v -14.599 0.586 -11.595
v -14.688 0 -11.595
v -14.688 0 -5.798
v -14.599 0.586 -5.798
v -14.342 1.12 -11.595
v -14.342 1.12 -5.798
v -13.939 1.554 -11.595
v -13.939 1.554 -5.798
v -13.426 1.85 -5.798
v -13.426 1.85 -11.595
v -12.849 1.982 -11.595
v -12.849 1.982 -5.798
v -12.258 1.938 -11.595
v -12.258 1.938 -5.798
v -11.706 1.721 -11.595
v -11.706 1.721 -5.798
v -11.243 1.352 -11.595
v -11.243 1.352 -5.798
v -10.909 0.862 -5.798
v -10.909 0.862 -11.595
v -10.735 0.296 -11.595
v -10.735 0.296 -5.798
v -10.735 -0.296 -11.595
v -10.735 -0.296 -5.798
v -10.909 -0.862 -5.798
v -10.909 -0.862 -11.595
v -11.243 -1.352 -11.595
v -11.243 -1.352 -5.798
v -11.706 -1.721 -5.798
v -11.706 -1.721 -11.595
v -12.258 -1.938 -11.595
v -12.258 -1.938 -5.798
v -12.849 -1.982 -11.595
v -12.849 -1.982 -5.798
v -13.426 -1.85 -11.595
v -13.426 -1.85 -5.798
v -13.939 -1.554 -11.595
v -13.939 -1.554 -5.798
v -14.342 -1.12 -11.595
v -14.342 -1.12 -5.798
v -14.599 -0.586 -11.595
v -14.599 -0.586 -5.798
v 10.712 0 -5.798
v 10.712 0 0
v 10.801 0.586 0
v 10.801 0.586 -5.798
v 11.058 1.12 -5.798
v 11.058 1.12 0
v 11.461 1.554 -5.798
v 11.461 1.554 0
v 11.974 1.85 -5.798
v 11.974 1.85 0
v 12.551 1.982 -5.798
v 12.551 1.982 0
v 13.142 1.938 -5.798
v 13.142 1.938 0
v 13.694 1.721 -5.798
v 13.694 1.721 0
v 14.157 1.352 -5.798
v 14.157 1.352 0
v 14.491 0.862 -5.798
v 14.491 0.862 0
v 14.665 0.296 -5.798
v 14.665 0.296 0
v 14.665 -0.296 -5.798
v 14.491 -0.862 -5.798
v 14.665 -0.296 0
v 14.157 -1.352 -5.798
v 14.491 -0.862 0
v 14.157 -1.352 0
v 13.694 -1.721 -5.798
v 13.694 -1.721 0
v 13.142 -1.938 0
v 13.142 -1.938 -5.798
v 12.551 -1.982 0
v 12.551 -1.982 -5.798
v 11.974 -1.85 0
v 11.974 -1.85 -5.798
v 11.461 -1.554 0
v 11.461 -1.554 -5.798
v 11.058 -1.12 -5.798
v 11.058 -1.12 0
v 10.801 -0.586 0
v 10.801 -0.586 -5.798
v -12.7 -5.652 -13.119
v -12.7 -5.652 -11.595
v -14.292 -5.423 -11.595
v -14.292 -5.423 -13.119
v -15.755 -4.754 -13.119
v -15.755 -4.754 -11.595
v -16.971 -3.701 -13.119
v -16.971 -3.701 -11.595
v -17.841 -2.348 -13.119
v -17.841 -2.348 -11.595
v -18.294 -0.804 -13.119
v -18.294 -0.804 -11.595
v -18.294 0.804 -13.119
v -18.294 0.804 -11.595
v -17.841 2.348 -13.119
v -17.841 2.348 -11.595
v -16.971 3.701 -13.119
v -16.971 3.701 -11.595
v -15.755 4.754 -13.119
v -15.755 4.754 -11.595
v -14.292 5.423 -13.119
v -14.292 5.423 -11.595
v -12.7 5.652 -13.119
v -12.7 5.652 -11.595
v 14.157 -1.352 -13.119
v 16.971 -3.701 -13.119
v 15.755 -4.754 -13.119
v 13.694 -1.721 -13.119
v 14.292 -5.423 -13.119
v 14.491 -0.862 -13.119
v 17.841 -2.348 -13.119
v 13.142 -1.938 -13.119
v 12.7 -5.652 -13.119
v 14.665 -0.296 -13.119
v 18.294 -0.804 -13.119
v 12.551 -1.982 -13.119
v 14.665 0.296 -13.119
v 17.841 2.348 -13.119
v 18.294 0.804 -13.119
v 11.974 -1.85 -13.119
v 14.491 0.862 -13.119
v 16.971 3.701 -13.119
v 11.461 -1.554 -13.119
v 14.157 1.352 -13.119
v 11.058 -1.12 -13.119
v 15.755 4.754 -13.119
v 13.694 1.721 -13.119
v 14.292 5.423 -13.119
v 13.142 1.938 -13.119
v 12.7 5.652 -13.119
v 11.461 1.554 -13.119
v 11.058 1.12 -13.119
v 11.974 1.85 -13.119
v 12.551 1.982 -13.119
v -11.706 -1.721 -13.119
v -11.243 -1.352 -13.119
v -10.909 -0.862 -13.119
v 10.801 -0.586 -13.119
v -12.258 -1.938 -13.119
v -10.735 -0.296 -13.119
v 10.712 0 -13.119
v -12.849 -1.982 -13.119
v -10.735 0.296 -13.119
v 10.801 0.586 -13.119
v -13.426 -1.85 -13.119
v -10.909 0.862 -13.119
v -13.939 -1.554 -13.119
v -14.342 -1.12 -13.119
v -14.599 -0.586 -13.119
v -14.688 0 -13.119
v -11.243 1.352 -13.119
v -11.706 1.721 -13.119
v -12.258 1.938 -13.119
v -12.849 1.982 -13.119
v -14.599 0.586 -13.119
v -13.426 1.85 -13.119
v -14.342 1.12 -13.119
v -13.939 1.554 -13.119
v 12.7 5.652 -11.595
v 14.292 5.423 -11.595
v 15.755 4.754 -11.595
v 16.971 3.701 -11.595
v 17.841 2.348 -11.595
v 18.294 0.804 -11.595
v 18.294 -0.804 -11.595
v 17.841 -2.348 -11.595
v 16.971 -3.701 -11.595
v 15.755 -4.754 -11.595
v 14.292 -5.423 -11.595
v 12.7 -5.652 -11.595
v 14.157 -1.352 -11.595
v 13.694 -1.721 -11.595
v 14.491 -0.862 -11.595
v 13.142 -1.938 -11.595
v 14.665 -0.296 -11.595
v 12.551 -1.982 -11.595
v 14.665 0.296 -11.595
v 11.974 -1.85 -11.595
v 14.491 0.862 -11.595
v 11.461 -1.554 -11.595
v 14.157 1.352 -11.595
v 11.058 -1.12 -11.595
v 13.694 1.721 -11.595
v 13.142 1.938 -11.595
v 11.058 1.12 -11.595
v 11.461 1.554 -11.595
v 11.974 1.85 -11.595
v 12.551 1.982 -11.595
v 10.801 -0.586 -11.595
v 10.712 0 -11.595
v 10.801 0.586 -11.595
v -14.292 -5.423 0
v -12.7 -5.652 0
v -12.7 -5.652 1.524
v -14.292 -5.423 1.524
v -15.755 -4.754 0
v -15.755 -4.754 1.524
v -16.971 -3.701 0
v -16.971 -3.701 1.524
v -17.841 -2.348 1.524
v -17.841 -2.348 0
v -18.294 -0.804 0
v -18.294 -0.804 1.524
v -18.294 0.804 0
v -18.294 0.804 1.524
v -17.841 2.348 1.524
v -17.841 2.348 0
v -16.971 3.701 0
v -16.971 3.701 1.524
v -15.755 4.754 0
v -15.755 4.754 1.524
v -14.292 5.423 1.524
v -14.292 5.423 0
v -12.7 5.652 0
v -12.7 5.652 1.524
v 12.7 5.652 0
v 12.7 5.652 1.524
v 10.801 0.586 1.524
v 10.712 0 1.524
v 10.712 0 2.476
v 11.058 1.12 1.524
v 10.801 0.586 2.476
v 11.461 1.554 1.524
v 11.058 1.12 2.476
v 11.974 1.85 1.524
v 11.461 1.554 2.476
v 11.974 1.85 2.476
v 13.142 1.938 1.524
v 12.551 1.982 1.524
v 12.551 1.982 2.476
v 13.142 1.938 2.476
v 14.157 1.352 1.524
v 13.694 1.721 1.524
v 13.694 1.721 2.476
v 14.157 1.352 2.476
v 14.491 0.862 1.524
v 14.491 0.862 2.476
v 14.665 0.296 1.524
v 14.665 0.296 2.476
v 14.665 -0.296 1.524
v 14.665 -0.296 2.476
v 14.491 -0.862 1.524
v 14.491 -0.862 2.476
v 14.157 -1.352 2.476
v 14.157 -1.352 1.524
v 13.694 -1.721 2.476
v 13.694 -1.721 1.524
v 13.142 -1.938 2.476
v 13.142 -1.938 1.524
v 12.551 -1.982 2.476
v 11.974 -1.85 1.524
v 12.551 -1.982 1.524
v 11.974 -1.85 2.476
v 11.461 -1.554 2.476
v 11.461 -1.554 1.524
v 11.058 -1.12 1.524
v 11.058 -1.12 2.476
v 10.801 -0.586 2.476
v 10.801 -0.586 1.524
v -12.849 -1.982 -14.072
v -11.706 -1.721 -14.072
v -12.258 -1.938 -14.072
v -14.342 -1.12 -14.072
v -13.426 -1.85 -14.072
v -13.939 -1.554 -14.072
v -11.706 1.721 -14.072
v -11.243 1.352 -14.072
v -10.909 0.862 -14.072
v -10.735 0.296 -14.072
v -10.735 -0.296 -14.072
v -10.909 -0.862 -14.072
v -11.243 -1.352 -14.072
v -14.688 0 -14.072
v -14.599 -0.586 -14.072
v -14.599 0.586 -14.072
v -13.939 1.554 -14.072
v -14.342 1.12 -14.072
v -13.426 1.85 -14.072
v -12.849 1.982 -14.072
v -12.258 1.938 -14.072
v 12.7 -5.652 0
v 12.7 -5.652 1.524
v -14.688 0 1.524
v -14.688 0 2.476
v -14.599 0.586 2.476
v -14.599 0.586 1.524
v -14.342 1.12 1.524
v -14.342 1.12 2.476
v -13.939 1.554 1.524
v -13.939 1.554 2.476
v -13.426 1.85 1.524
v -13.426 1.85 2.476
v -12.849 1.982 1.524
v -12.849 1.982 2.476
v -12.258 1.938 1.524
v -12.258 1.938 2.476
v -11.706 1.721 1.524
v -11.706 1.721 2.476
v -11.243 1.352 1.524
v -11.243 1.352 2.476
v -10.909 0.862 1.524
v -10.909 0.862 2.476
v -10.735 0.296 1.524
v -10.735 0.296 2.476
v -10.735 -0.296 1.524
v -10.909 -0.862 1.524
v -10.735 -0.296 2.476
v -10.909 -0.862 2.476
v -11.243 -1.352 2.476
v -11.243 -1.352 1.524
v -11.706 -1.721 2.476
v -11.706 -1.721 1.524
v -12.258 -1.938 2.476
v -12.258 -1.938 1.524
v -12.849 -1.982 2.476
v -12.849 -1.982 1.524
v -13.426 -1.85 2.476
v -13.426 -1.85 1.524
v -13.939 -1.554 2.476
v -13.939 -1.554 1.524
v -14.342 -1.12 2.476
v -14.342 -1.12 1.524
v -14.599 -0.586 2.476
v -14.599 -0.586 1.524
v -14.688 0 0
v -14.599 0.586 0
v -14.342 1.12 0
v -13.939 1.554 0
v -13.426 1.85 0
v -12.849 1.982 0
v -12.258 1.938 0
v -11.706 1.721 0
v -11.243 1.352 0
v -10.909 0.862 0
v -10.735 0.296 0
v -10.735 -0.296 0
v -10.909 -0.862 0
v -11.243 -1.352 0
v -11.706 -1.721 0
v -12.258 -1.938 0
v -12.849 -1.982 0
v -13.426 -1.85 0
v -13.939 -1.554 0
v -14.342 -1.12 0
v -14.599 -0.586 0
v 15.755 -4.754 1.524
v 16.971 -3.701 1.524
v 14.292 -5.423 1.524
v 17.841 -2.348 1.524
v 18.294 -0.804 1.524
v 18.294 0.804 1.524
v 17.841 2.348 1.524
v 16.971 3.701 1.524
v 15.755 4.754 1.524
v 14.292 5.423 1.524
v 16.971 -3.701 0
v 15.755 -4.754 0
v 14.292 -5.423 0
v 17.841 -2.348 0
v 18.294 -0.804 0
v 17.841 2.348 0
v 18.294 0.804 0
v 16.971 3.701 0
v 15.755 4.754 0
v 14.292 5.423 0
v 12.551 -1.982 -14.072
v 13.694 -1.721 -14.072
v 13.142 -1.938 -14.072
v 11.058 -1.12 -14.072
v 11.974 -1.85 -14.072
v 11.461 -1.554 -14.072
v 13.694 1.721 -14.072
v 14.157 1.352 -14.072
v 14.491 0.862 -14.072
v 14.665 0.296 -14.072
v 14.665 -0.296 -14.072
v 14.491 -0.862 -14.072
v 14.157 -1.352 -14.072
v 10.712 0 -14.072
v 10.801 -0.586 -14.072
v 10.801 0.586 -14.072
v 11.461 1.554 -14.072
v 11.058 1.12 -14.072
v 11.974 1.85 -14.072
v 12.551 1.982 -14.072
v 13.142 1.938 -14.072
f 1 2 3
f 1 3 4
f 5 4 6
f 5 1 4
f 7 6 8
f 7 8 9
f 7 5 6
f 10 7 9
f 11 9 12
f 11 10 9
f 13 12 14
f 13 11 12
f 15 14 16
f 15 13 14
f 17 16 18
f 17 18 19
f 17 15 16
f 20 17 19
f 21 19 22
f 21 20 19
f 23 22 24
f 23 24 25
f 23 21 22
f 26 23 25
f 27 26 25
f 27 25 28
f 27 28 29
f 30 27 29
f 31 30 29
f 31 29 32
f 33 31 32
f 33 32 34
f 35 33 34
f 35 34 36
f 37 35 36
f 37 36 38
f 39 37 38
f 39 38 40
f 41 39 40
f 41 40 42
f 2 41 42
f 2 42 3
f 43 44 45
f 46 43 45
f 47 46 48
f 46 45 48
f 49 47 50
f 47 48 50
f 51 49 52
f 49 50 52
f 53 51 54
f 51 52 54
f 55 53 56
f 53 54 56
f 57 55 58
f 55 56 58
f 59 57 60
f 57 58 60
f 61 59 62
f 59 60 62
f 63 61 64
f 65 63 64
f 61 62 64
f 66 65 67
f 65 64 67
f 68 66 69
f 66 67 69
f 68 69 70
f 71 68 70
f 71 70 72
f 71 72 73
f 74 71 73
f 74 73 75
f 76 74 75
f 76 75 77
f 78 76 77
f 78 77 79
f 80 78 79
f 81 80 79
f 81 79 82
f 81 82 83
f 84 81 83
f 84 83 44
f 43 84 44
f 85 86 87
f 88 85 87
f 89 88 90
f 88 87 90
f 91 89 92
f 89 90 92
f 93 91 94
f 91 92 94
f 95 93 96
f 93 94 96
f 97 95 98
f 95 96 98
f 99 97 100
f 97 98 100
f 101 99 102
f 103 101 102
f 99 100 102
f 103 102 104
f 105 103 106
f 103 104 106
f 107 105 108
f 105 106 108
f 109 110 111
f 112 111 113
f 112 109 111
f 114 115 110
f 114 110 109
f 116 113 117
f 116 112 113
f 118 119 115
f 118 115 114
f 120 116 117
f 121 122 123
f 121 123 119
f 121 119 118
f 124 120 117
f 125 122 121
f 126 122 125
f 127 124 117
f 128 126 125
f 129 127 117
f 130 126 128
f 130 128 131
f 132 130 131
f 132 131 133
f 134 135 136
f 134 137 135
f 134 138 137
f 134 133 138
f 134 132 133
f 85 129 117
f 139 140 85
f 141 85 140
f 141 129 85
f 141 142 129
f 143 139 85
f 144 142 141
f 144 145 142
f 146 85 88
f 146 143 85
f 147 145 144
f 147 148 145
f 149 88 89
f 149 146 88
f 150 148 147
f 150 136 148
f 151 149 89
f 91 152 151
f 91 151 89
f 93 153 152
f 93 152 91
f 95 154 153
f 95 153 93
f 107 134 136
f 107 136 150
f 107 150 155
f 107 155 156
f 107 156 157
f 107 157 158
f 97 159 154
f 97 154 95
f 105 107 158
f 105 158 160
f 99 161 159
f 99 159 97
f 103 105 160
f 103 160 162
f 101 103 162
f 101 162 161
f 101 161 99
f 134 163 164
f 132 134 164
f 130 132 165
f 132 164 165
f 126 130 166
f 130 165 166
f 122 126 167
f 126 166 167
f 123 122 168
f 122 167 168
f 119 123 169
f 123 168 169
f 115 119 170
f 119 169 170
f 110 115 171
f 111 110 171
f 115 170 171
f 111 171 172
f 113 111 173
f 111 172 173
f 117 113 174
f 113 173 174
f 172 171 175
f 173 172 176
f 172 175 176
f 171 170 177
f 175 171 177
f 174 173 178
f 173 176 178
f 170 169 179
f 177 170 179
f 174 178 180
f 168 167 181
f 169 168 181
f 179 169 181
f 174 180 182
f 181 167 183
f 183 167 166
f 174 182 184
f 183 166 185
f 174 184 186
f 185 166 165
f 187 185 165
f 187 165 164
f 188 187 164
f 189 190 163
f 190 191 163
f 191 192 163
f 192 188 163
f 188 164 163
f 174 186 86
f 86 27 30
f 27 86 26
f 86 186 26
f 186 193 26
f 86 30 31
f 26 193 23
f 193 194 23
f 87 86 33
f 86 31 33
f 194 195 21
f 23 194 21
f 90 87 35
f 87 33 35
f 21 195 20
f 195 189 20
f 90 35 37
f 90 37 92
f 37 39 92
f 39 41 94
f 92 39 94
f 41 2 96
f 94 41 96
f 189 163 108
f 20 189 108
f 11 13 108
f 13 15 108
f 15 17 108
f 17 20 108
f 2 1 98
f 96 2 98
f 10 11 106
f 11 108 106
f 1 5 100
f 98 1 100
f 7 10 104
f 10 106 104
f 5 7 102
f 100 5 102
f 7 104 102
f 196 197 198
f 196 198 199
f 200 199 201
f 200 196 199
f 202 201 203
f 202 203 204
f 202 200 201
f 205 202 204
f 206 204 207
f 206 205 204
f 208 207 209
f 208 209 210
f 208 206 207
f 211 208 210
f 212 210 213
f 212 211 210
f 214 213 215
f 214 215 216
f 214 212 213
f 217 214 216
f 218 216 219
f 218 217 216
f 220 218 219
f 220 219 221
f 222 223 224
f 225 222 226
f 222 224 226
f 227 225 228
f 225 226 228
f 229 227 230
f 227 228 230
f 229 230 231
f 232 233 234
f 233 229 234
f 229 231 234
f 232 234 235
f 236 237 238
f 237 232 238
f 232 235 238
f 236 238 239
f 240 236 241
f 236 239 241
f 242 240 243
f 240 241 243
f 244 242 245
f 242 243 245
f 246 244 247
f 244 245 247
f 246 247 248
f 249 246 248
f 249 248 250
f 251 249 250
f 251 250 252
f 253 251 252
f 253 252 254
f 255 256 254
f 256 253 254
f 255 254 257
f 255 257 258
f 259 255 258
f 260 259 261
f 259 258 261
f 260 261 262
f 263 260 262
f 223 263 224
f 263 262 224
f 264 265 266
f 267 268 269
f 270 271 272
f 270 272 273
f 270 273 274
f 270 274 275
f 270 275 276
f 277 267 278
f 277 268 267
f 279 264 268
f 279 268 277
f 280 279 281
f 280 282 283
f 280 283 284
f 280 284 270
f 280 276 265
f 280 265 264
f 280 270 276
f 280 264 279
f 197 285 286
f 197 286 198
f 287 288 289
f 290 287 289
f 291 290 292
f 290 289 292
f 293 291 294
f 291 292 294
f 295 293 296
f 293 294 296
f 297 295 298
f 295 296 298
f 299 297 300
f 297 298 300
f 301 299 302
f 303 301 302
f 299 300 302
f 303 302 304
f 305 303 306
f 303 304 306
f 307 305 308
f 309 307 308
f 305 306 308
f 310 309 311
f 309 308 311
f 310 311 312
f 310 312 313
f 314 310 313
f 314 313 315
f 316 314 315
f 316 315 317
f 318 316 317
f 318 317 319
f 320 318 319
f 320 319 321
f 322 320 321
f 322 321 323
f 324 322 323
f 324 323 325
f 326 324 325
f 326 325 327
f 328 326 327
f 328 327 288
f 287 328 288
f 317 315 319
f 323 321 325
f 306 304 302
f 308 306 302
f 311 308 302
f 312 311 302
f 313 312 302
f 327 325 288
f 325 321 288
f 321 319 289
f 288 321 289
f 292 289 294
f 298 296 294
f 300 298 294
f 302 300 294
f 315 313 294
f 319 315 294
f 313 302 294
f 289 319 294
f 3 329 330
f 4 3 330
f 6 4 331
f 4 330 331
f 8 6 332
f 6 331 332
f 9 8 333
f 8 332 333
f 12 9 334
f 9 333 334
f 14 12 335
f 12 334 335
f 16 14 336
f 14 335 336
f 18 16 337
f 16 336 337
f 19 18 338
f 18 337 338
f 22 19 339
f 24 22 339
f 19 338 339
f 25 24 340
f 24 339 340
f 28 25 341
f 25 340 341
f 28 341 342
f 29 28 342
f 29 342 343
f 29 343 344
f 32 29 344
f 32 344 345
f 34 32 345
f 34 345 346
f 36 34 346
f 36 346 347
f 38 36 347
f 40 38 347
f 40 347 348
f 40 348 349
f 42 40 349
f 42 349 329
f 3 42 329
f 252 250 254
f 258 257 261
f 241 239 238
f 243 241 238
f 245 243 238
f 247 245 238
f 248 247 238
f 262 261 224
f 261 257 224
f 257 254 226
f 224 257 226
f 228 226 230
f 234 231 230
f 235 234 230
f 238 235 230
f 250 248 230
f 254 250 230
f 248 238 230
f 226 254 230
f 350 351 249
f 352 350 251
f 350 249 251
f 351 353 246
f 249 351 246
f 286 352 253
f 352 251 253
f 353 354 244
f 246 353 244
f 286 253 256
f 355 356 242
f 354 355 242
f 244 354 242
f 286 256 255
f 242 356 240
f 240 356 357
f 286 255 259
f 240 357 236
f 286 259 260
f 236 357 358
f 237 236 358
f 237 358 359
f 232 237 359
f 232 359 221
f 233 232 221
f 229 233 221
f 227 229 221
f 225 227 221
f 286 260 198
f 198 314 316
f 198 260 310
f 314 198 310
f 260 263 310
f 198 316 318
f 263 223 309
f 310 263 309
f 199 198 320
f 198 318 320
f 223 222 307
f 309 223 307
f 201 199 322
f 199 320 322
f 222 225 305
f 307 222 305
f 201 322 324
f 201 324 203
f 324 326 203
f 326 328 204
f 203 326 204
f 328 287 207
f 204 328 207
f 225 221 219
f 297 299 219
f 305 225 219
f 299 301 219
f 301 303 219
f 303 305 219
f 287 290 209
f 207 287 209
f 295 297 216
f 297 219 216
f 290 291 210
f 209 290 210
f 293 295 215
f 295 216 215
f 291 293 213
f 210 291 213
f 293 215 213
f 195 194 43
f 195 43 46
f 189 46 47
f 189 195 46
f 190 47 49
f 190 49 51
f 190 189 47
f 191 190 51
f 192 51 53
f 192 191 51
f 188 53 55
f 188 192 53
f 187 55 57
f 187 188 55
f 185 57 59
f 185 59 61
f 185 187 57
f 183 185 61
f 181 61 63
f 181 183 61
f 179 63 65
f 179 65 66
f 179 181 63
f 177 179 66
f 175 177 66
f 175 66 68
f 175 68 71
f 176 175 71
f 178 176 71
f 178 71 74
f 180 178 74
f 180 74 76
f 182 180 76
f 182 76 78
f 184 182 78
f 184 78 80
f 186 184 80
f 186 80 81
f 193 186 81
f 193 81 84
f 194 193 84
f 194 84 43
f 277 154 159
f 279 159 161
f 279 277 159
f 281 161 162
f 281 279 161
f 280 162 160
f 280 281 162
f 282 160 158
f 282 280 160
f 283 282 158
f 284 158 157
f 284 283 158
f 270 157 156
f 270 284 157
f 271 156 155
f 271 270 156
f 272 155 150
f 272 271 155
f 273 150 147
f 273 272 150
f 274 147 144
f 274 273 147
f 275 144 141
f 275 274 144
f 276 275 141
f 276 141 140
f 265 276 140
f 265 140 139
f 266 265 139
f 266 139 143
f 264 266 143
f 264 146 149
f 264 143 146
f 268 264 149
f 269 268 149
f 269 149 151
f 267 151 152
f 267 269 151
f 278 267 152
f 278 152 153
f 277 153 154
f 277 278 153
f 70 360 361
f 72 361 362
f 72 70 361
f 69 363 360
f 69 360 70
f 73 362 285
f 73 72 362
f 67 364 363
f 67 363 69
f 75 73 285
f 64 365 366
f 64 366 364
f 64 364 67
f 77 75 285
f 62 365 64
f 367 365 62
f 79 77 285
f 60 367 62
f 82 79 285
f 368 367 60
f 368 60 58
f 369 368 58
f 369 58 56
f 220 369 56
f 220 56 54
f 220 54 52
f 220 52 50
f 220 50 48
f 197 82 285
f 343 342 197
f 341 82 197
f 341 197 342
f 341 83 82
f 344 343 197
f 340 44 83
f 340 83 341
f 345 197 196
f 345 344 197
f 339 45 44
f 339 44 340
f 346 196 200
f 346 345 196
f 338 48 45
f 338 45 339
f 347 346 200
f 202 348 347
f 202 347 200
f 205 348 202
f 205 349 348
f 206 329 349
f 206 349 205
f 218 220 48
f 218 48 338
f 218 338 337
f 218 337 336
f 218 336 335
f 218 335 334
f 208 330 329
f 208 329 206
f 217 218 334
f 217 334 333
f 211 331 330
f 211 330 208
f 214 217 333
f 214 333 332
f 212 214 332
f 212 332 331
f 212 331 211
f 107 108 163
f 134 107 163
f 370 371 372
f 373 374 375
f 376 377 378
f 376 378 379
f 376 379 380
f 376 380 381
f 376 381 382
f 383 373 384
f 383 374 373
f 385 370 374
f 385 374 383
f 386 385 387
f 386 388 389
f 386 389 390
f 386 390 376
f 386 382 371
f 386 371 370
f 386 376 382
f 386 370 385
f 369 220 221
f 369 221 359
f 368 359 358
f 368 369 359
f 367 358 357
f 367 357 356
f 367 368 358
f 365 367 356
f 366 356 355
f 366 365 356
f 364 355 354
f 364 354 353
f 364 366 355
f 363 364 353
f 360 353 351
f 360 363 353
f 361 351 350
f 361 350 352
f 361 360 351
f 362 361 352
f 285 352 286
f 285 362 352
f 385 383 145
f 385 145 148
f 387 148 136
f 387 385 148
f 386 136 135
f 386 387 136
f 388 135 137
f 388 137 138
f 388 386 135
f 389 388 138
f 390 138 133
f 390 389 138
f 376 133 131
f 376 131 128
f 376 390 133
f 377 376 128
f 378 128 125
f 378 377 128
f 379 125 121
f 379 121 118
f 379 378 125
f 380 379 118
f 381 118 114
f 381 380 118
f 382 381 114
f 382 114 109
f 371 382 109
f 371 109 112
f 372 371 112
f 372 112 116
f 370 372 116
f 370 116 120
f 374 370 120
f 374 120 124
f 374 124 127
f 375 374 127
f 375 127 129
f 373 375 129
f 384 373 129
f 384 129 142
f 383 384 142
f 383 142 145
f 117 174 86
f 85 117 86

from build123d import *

# Parameters (mm, degrees)
SKETCH1_R           = 1.98755
BOSS_EXTRUDE1_DEPTH = 1.524
BOSS_EXTRUDE2_START = -2.4765
SKETCH3_R           = 1.98755
BOSS_EXTRUDE2_DEPTH = 8.27405


with BuildPart() as part:
    # Sketch1 → Boss-Extrude1 (new body)
    with BuildSketch(Plane.XY):
        with BuildLine():
            Line((-12.7, 5.6515), (12.7, 5.6515))
            ThreePointArc((12.7, 5.6515), (18.3515, 0), (12.7, -5.6515))
            Line((12.7, -5.6515), (-12.7, -5.6515))
            ThreePointArc((-12.7, -5.6515), (-18.3515, 0), (-12.7, 5.6515))
        make_face()
        with Locations((-12.7, 0)):
            Circle(SKETCH1_R, mode=Mode.SUBTRACT)
        with Locations((12.7, 0)):
            Circle(SKETCH1_R, mode=Mode.SUBTRACT)
    boss_extrude1 = extrude(amount=BOSS_EXTRUDE1_DEPTH)

    # Sketch3 → Boss-Extrude2 (add)
    with BuildSketch(Plane(origin=(0, 0, 0), x_dir=(-1, 0, 0), z_dir=(0, 0, -1)).offset(BOSS_EXTRUDE2_START)):
        with Locations((-12.7, 0)):
            Circle(SKETCH3_R)
        with Locations((12.7, 0)):
            Circle(SKETCH3_R)
    boss_extrude2 = extrude(amount=BOSS_EXTRUDE2_DEPTH)

    # Mirror4: Boss-Extrude1, Boss-Extrude2 across plane
    add(boss_extrude1.mirror(Plane.XY.offset(-5.79755)))
    add(boss_extrude2.mirror(Plane.XY.offset(-5.79755)))


solid = part.part
